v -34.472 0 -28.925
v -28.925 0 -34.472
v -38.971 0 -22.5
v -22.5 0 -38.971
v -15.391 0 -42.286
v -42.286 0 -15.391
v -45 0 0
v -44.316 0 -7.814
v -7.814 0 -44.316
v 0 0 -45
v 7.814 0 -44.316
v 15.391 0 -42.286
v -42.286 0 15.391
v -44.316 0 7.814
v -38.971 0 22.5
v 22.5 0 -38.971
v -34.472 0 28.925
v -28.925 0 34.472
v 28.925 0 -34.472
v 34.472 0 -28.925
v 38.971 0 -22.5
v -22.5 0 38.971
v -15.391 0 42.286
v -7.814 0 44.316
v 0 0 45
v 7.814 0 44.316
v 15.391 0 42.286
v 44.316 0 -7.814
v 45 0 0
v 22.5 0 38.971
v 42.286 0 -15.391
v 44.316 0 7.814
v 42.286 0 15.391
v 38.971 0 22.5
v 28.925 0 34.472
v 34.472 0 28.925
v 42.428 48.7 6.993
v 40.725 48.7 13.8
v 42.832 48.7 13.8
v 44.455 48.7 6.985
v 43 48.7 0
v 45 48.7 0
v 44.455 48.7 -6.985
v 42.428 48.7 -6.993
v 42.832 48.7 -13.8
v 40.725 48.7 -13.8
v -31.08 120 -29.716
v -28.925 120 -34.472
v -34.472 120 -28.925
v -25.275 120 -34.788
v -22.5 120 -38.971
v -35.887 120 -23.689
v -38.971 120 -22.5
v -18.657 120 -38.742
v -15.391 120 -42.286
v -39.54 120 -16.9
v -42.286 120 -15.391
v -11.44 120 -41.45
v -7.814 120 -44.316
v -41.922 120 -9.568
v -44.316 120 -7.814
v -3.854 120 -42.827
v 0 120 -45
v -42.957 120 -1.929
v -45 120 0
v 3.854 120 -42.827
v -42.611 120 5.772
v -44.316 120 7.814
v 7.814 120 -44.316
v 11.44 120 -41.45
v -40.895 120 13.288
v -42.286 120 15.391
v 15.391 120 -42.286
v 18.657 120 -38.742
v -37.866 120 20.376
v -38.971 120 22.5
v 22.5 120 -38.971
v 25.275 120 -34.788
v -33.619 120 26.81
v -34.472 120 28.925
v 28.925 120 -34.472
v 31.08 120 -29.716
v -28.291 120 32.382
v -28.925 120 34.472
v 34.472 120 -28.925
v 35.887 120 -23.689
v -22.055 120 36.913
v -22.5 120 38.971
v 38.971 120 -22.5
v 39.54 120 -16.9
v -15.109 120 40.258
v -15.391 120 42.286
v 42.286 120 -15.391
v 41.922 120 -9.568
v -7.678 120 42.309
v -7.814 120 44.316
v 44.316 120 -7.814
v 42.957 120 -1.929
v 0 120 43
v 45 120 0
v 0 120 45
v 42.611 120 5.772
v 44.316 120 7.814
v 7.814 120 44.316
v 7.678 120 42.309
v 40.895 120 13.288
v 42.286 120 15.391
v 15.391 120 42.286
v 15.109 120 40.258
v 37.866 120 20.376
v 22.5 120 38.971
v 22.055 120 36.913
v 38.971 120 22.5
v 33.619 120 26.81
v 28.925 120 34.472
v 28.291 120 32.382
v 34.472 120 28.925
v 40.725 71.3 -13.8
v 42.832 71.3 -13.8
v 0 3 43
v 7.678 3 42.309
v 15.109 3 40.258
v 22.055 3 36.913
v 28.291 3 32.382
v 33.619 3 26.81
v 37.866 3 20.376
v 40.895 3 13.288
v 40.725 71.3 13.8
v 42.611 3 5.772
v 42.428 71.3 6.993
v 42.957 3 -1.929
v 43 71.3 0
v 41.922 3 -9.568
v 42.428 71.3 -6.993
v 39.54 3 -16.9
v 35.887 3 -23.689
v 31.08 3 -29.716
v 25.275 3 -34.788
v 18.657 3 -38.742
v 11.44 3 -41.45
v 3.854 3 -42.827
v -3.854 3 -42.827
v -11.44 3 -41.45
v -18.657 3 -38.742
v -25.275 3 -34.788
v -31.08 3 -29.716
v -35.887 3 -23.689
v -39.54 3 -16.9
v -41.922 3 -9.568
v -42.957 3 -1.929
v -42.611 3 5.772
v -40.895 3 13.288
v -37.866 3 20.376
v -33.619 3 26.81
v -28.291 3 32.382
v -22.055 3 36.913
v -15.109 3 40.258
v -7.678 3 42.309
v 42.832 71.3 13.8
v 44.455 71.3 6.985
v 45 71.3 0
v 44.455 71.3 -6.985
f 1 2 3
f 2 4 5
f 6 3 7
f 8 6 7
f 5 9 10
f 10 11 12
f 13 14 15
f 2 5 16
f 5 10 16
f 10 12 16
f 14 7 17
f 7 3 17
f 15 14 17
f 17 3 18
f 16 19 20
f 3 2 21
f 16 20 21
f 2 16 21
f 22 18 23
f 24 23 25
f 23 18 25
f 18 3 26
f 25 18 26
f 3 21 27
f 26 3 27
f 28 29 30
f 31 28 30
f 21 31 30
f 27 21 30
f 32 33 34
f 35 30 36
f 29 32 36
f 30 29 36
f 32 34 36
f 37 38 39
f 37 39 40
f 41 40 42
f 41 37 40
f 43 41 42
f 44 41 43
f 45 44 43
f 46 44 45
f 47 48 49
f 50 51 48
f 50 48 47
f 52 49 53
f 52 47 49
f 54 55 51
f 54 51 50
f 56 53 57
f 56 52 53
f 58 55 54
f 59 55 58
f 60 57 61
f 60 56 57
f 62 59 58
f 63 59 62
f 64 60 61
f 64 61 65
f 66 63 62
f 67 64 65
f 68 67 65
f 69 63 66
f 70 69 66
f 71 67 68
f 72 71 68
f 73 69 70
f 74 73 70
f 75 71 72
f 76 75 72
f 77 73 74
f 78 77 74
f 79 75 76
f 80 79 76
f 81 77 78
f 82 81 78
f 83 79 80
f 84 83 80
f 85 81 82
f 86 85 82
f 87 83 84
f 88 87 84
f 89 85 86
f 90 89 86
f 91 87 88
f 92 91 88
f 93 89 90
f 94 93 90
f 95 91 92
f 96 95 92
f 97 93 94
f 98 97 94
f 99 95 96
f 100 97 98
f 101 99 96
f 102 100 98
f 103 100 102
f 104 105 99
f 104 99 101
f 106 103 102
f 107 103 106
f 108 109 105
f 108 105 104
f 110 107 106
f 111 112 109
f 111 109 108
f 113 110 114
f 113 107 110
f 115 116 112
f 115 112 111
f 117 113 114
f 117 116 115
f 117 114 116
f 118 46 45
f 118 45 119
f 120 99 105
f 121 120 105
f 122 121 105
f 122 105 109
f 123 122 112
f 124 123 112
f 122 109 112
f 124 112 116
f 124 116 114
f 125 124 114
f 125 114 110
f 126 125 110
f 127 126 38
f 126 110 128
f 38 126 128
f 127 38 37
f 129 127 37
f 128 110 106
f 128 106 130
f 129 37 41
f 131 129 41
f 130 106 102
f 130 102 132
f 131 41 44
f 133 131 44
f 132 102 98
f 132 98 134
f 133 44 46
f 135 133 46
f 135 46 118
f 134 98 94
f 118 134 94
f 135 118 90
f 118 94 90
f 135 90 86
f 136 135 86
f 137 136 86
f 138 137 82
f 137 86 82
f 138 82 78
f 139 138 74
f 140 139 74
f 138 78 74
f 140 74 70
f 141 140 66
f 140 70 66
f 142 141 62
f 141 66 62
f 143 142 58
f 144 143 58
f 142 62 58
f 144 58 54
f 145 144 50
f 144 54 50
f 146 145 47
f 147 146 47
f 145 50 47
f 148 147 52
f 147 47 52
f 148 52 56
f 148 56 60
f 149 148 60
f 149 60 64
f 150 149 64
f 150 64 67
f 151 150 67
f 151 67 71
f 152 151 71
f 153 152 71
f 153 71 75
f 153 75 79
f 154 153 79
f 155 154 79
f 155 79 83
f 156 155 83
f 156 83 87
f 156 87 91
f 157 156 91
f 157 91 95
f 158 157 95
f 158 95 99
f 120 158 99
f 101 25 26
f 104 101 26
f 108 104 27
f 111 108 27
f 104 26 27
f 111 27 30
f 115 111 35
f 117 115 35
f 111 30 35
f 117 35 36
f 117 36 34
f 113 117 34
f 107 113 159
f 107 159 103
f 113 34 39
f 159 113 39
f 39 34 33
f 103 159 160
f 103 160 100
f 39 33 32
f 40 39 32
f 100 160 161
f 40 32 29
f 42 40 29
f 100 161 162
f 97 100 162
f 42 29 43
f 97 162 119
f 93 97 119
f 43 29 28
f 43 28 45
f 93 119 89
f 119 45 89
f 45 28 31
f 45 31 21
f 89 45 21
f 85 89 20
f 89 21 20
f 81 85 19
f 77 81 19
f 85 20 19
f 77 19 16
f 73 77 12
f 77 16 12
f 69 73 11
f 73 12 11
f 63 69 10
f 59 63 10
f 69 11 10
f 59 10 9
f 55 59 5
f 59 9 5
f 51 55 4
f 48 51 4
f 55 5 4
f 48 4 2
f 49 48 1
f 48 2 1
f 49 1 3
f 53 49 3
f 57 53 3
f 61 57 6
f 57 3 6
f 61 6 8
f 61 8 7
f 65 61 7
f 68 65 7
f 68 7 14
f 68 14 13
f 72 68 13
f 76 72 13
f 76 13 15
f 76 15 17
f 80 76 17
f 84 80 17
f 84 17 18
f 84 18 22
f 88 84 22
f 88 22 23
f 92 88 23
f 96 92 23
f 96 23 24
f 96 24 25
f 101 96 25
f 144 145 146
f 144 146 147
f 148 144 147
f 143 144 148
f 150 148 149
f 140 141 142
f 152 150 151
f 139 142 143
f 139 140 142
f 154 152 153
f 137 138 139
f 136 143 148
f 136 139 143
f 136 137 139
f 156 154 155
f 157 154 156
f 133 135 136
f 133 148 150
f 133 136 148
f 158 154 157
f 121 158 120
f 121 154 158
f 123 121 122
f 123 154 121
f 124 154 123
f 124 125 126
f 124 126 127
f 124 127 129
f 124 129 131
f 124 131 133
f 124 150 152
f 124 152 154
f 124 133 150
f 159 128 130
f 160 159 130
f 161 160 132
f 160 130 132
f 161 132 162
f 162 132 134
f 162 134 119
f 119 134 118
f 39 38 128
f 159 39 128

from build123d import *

# Parameters (mm, degrees)
SKETCH1_R            = 45
JAR_BODY_DEPTH       = 120
JAR_INSIDE_START     = 120
SKETCH2_R            = 43
JAR_INSIDE_DEPTH     = 117
TURBIDITY_HOLE_START = 40
SKETCH3_W            = 27.6
SKETCH3_H            = 22.6
TURBIDITY_HOLE_DEPTH = 10


with BuildPart() as part:
    # Sketch1 → Jar_Body (new body)
    with BuildSketch(Plane(origin=(0, 0, 0), x_dir=(1, 0, 0), z_dir=(0, 1, 0))):
        with Locations(Location((0, 0, 0), (0, 0, 270))):
            Circle(SKETCH1_R)
    extrude(amount=JAR_BODY_DEPTH)

    # Sketch2 → Jar_Inside (cut)
    with BuildSketch(Plane(origin=(0, 0, 0), x_dir=(1, 0, 0), z_dir=(0, 1, 0)).offset(JAR_INSIDE_START)):
        with Locations(Location((0, 0, 0), (0, 0, 270))):
            Circle(SKETCH2_R)
    extrude(amount=-JAR_INSIDE_DEPTH, mode=Mode.SUBTRACT)

    # Sketch3 → Turbidity_Hole (cut)
    with BuildSketch(Plane(origin=(0, 0, 0), x_dir=(0, 0, -1), z_dir=(1, 0, 0)).offset(TURBIDITY_HOLE_START)):
        with Locations((0, 60)):
            Rectangle(SKETCH3_W, SKETCH3_H)
    extrude(amount=TURBIDITY_HOLE_DEPTH, mode=Mode.SUBTRACT)


solid = part.part
